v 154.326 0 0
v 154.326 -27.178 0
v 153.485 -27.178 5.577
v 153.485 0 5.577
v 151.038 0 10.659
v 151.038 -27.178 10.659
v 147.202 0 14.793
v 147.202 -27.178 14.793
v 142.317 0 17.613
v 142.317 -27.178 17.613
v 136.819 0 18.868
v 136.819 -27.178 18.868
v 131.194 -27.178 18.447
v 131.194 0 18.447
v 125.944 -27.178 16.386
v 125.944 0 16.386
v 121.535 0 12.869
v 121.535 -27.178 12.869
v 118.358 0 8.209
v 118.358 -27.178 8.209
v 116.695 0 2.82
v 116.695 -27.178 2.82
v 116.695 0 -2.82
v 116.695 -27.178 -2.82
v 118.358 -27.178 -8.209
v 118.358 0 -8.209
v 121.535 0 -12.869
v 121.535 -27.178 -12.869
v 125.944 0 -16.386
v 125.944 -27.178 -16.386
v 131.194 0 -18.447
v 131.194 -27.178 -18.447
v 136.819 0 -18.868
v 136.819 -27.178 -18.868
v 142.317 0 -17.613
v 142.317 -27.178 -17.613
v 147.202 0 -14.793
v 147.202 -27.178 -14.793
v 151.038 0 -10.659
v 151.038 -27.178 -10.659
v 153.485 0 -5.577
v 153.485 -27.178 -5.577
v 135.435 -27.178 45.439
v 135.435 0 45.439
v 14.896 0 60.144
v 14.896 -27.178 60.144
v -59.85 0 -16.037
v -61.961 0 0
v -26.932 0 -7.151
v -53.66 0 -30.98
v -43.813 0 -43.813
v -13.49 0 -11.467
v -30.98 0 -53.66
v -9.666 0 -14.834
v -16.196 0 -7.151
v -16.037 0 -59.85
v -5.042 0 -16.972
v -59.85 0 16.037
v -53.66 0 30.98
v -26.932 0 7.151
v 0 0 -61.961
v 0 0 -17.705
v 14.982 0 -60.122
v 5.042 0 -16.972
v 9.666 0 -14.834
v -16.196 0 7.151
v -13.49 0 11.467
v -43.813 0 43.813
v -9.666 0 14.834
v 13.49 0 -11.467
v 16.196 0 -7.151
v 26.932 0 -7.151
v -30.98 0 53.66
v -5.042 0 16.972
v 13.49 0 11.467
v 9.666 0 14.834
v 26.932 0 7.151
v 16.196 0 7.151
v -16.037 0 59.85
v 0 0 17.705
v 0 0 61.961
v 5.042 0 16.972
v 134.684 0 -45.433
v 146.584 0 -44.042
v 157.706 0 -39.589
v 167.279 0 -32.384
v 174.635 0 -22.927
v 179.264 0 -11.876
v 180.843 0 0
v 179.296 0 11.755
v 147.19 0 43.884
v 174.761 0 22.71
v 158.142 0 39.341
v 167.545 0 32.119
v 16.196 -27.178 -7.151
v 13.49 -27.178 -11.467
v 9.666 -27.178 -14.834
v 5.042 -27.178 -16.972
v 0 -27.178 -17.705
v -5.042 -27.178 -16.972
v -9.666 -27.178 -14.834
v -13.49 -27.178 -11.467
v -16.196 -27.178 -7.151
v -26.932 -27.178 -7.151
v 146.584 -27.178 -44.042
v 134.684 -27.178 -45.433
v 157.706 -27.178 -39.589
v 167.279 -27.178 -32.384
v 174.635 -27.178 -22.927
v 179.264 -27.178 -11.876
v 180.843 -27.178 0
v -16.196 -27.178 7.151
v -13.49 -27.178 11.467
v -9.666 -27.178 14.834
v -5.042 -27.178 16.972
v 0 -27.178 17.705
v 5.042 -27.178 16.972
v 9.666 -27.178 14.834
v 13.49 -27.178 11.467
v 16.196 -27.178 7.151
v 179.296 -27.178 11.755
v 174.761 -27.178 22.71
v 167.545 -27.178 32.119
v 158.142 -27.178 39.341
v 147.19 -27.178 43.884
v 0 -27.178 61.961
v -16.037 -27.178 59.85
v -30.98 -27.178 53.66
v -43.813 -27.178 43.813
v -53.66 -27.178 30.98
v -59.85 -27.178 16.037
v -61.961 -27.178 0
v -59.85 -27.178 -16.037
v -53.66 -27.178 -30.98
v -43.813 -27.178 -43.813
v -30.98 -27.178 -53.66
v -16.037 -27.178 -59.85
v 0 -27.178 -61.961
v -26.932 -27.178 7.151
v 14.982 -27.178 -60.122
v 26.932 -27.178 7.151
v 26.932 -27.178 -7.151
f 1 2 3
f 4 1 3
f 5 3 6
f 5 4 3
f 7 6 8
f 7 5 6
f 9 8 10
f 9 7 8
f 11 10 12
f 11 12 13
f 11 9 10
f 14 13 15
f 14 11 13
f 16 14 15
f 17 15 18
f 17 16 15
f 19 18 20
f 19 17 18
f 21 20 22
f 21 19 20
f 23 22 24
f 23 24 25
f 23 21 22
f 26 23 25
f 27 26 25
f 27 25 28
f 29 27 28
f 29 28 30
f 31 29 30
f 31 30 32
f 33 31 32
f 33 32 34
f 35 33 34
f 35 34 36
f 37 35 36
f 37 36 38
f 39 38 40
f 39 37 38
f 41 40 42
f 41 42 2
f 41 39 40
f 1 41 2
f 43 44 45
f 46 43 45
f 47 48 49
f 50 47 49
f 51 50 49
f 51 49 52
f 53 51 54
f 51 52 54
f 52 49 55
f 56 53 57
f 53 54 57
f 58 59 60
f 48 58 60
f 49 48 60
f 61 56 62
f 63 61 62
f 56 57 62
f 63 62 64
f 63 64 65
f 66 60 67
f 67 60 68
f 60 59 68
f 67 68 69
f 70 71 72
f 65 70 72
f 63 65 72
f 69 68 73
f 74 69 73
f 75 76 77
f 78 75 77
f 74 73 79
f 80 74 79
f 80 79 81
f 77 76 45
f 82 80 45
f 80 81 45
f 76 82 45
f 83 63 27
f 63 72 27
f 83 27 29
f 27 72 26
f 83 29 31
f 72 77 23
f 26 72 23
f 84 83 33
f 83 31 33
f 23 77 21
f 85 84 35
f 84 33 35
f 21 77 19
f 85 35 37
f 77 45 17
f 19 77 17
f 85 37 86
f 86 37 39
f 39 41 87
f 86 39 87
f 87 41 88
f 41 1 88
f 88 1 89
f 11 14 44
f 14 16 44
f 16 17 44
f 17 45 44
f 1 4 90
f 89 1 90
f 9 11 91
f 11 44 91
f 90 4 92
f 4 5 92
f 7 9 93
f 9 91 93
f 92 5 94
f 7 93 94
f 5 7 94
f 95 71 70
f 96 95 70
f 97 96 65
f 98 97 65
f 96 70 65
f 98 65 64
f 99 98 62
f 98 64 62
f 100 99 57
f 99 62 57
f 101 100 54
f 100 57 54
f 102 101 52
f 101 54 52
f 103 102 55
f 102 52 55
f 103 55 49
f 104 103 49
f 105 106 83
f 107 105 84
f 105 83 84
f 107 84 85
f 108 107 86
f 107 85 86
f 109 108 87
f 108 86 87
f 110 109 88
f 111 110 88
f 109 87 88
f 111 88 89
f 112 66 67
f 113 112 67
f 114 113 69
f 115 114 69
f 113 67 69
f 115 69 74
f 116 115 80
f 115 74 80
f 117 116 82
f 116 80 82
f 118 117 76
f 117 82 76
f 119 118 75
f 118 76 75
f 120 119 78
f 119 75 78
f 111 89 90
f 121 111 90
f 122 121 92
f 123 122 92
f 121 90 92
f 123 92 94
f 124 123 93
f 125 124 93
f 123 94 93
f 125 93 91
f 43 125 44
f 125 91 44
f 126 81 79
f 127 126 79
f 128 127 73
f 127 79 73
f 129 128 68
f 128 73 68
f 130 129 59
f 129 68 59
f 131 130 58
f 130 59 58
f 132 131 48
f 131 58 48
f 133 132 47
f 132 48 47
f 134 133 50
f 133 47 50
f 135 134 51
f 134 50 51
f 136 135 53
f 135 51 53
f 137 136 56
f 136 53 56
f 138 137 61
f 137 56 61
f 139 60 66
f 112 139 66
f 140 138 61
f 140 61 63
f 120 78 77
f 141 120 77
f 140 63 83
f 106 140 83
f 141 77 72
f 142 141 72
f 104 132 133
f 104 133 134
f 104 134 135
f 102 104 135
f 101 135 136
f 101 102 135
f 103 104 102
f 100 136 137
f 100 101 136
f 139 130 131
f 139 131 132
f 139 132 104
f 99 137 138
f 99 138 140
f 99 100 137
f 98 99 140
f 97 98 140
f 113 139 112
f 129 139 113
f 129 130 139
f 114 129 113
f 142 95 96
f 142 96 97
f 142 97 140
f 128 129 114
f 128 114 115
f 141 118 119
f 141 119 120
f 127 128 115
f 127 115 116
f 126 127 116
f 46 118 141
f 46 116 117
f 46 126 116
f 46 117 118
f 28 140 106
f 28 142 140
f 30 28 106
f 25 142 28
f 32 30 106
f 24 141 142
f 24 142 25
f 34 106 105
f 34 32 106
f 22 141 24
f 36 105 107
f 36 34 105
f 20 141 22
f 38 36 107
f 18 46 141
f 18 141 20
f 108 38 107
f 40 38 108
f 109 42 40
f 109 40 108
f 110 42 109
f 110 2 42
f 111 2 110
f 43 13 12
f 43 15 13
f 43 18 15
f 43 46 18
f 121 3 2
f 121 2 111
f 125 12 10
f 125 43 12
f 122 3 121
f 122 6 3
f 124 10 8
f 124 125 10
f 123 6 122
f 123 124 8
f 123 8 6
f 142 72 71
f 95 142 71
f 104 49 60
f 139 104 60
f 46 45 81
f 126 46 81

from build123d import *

# Parameters (mm, degrees)
F0_R     = 18.9209145911
F1_DEPTH = 27.178


with BuildPart() as f1:
    # F0 (on Front) → F1 (new body)
    with BuildSketch(Plane.XZ):
        with BuildLine():
            Line((14.8961656121, 60.1436708064), (0, 61.9609303353))
            ThreePointArc((0, 61.9609303353), (-61.9609303353, 0), (0, -61.9609303353))
            Line((0, -61.9609303353), (14.9818155033, -60.1223926024))
            ThreePointArc((14.9818155033, -60.1223926024), (48.8233761364, -38.1501616073), (61.9609303353, 0))
            ThreePointArc((61.9609303353, 0), (48.7961943586, 38.1849224712), (14.8961656121, 60.1436708064))
        make_face()
        with BuildLine():
            ThreePointArc((16.1964445954, -7.1509783156), (0, -17.7048385591), (-16.1964445954, -7.1509783156))
            Line((-16.1964445954, -7.1509783156), (-26.931880042, -7.1509783156))
            Line((-26.931880042, -7.1509783156), (-26.931880042, 7.1509783156))
            Line((-26.931880042, 7.1509783156), (-16.1964445954, 7.1509783156))
            ThreePointArc((-16.1964445954, 7.1509783156), (0, 17.7048385591), (16.1964445954, 7.1509783156))
            Line((16.1964445954, 7.1509783156), (26.931880042, 7.1509783156))
            Line((26.931880042, 7.1509783156), (26.931880042, -7.1509783156))
            Line((26.931880042, -7.1509783156), (16.1964445954, -7.1509783156))
        make_face(mode=Mode.SUBTRACT)
        with BuildLine():
            Line((135.4351173078, 45.4385067882), (14.8961656121, 60.1436708064))
            ThreePointArc((14.8961656121, 60.1436708064), (48.7961943586, 38.1849224712), (61.9609303353, 0))
            ThreePointArc((61.9609303353, 0), (48.8233761364, -38.1501616073), (14.9818155033, -60.1223926024))
            Line((14.9818155033, -60.1223926024), (134.6838830583, -45.4327998856))
            ThreePointArc((134.6838830583, -45.4327998856), (89.9676969368, 0.375627963), (135.4351173078, 45.4385067882))
        make_face()
        with BuildLine():
            ThreePointArc((180.8431782929, 0), (167.5453108139, 32.1191138638), (135.4351173078, 45.4385067882))
            ThreePointArc((135.4351173078, 45.4385067882), (89.9676969368, 0.375627963), (134.6838830583, -45.4327998856))
            ThreePointArc((134.6838830583, -45.4327998856), (167.2786925178, -32.3837144333), (180.8431782929, 0))
        make_face()
        with Locations((135.4046612978, 0)):
            Circle(F0_R, mode=Mode.SUBTRACT)
    extrude(amount=F1_DEPTH)


solid = f1.part
